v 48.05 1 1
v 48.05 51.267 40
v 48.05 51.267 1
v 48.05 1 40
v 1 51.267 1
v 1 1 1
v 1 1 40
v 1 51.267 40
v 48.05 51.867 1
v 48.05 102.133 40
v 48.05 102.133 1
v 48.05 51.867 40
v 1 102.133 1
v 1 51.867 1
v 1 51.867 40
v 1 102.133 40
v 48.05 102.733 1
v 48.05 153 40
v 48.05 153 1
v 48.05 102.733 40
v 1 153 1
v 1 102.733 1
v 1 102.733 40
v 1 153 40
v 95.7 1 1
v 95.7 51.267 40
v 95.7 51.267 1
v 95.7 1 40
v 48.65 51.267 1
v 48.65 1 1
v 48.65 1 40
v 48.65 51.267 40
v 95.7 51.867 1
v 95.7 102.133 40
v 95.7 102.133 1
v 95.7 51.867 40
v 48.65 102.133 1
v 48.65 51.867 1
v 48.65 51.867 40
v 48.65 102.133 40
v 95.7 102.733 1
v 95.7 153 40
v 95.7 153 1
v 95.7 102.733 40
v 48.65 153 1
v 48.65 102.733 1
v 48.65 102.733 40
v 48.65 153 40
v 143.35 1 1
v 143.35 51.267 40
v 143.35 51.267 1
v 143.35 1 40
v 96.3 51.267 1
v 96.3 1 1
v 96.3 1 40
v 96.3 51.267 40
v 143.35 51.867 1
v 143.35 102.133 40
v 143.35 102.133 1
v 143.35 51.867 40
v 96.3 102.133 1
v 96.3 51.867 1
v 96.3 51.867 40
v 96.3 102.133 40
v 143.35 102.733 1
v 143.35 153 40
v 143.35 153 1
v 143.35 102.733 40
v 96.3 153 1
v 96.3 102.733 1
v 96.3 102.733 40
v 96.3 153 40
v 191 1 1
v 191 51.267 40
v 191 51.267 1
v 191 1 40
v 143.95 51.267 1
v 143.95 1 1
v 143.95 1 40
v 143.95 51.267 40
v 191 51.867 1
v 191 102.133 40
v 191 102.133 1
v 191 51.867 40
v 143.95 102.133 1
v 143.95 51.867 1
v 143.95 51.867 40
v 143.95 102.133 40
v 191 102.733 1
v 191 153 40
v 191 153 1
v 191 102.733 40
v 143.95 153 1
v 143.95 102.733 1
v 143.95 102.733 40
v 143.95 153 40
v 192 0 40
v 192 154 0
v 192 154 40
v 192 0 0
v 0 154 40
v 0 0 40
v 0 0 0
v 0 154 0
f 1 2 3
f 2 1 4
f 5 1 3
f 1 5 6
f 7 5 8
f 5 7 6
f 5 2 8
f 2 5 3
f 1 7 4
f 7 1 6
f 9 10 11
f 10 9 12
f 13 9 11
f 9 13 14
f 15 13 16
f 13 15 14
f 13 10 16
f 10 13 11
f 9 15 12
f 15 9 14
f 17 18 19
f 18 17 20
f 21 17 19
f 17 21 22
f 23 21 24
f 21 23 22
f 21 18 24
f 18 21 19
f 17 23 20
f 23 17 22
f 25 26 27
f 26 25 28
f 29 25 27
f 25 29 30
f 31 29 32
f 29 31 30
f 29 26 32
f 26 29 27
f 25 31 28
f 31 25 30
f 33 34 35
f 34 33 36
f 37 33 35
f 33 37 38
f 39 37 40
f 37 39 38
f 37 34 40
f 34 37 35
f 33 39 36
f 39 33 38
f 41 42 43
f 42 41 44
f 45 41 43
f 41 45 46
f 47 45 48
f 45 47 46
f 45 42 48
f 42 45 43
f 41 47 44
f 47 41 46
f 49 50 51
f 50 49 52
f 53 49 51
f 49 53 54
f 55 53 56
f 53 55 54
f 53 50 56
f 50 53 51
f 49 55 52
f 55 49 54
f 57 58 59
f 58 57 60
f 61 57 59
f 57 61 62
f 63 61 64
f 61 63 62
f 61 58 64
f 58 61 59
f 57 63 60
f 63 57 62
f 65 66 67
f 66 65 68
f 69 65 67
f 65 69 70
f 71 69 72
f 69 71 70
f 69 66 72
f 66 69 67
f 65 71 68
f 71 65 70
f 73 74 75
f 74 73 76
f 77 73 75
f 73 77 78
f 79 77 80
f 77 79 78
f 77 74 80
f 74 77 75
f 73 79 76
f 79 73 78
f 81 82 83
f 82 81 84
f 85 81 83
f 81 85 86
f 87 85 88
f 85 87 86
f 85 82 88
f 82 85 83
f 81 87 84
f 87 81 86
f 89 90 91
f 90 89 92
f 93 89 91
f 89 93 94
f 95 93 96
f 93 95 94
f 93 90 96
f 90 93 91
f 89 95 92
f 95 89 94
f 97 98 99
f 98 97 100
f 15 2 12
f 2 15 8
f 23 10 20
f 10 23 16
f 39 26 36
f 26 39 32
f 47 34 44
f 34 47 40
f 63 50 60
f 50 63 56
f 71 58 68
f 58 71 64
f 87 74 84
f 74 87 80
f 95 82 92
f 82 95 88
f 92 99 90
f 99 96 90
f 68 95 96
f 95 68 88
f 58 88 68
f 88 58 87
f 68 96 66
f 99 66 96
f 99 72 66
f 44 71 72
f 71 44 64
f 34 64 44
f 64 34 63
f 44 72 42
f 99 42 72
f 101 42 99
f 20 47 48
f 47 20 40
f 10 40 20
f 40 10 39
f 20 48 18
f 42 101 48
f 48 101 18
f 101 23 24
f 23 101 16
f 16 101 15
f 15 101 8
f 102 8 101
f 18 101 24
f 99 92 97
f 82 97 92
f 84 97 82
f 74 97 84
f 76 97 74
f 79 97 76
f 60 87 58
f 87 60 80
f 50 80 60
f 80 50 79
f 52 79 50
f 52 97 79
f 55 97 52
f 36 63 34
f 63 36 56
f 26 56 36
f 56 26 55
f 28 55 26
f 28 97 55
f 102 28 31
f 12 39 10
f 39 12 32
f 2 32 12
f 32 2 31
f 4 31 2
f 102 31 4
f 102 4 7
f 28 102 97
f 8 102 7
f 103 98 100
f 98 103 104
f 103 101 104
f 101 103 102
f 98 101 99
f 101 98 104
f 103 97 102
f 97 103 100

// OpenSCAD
/////////////////Parameters
/* [Sizes] */
// total width
tw =192; // [20:250]
// total length
tl = 154; // [20:250]
// height
owh = 40; // [10:100]
// boxes in width direction
nw=4; // [1:10]
// boxes in length direction
nl=3; // [1:10]
// outer wall width
oww = 1; // [0:3]
// inner wall width 
iww = 0.6; // [0:3]
/* [Hidden] */

//drawing

boxes(nw,nl,oww,iww,owh,(tw-2*oww+iww)/nw,(tl-2*oww+iww)/nl);

//////////////////Calculations + modules

module boxes(nbw,nbl,ow,iw,oh,boxw,boxl) {
	difference() {
		cube([nbw*boxw+ow+ow-iw,nbl*boxl+ow+ow-iw,oh]);
		for (i=[0:nbw-1])
			for (j=[0:nbl-1])
				translate([i*boxw+ow,j*boxl+ow,ow])
					#cube([boxw-iw,boxl-iw,oh]);
	}
}
